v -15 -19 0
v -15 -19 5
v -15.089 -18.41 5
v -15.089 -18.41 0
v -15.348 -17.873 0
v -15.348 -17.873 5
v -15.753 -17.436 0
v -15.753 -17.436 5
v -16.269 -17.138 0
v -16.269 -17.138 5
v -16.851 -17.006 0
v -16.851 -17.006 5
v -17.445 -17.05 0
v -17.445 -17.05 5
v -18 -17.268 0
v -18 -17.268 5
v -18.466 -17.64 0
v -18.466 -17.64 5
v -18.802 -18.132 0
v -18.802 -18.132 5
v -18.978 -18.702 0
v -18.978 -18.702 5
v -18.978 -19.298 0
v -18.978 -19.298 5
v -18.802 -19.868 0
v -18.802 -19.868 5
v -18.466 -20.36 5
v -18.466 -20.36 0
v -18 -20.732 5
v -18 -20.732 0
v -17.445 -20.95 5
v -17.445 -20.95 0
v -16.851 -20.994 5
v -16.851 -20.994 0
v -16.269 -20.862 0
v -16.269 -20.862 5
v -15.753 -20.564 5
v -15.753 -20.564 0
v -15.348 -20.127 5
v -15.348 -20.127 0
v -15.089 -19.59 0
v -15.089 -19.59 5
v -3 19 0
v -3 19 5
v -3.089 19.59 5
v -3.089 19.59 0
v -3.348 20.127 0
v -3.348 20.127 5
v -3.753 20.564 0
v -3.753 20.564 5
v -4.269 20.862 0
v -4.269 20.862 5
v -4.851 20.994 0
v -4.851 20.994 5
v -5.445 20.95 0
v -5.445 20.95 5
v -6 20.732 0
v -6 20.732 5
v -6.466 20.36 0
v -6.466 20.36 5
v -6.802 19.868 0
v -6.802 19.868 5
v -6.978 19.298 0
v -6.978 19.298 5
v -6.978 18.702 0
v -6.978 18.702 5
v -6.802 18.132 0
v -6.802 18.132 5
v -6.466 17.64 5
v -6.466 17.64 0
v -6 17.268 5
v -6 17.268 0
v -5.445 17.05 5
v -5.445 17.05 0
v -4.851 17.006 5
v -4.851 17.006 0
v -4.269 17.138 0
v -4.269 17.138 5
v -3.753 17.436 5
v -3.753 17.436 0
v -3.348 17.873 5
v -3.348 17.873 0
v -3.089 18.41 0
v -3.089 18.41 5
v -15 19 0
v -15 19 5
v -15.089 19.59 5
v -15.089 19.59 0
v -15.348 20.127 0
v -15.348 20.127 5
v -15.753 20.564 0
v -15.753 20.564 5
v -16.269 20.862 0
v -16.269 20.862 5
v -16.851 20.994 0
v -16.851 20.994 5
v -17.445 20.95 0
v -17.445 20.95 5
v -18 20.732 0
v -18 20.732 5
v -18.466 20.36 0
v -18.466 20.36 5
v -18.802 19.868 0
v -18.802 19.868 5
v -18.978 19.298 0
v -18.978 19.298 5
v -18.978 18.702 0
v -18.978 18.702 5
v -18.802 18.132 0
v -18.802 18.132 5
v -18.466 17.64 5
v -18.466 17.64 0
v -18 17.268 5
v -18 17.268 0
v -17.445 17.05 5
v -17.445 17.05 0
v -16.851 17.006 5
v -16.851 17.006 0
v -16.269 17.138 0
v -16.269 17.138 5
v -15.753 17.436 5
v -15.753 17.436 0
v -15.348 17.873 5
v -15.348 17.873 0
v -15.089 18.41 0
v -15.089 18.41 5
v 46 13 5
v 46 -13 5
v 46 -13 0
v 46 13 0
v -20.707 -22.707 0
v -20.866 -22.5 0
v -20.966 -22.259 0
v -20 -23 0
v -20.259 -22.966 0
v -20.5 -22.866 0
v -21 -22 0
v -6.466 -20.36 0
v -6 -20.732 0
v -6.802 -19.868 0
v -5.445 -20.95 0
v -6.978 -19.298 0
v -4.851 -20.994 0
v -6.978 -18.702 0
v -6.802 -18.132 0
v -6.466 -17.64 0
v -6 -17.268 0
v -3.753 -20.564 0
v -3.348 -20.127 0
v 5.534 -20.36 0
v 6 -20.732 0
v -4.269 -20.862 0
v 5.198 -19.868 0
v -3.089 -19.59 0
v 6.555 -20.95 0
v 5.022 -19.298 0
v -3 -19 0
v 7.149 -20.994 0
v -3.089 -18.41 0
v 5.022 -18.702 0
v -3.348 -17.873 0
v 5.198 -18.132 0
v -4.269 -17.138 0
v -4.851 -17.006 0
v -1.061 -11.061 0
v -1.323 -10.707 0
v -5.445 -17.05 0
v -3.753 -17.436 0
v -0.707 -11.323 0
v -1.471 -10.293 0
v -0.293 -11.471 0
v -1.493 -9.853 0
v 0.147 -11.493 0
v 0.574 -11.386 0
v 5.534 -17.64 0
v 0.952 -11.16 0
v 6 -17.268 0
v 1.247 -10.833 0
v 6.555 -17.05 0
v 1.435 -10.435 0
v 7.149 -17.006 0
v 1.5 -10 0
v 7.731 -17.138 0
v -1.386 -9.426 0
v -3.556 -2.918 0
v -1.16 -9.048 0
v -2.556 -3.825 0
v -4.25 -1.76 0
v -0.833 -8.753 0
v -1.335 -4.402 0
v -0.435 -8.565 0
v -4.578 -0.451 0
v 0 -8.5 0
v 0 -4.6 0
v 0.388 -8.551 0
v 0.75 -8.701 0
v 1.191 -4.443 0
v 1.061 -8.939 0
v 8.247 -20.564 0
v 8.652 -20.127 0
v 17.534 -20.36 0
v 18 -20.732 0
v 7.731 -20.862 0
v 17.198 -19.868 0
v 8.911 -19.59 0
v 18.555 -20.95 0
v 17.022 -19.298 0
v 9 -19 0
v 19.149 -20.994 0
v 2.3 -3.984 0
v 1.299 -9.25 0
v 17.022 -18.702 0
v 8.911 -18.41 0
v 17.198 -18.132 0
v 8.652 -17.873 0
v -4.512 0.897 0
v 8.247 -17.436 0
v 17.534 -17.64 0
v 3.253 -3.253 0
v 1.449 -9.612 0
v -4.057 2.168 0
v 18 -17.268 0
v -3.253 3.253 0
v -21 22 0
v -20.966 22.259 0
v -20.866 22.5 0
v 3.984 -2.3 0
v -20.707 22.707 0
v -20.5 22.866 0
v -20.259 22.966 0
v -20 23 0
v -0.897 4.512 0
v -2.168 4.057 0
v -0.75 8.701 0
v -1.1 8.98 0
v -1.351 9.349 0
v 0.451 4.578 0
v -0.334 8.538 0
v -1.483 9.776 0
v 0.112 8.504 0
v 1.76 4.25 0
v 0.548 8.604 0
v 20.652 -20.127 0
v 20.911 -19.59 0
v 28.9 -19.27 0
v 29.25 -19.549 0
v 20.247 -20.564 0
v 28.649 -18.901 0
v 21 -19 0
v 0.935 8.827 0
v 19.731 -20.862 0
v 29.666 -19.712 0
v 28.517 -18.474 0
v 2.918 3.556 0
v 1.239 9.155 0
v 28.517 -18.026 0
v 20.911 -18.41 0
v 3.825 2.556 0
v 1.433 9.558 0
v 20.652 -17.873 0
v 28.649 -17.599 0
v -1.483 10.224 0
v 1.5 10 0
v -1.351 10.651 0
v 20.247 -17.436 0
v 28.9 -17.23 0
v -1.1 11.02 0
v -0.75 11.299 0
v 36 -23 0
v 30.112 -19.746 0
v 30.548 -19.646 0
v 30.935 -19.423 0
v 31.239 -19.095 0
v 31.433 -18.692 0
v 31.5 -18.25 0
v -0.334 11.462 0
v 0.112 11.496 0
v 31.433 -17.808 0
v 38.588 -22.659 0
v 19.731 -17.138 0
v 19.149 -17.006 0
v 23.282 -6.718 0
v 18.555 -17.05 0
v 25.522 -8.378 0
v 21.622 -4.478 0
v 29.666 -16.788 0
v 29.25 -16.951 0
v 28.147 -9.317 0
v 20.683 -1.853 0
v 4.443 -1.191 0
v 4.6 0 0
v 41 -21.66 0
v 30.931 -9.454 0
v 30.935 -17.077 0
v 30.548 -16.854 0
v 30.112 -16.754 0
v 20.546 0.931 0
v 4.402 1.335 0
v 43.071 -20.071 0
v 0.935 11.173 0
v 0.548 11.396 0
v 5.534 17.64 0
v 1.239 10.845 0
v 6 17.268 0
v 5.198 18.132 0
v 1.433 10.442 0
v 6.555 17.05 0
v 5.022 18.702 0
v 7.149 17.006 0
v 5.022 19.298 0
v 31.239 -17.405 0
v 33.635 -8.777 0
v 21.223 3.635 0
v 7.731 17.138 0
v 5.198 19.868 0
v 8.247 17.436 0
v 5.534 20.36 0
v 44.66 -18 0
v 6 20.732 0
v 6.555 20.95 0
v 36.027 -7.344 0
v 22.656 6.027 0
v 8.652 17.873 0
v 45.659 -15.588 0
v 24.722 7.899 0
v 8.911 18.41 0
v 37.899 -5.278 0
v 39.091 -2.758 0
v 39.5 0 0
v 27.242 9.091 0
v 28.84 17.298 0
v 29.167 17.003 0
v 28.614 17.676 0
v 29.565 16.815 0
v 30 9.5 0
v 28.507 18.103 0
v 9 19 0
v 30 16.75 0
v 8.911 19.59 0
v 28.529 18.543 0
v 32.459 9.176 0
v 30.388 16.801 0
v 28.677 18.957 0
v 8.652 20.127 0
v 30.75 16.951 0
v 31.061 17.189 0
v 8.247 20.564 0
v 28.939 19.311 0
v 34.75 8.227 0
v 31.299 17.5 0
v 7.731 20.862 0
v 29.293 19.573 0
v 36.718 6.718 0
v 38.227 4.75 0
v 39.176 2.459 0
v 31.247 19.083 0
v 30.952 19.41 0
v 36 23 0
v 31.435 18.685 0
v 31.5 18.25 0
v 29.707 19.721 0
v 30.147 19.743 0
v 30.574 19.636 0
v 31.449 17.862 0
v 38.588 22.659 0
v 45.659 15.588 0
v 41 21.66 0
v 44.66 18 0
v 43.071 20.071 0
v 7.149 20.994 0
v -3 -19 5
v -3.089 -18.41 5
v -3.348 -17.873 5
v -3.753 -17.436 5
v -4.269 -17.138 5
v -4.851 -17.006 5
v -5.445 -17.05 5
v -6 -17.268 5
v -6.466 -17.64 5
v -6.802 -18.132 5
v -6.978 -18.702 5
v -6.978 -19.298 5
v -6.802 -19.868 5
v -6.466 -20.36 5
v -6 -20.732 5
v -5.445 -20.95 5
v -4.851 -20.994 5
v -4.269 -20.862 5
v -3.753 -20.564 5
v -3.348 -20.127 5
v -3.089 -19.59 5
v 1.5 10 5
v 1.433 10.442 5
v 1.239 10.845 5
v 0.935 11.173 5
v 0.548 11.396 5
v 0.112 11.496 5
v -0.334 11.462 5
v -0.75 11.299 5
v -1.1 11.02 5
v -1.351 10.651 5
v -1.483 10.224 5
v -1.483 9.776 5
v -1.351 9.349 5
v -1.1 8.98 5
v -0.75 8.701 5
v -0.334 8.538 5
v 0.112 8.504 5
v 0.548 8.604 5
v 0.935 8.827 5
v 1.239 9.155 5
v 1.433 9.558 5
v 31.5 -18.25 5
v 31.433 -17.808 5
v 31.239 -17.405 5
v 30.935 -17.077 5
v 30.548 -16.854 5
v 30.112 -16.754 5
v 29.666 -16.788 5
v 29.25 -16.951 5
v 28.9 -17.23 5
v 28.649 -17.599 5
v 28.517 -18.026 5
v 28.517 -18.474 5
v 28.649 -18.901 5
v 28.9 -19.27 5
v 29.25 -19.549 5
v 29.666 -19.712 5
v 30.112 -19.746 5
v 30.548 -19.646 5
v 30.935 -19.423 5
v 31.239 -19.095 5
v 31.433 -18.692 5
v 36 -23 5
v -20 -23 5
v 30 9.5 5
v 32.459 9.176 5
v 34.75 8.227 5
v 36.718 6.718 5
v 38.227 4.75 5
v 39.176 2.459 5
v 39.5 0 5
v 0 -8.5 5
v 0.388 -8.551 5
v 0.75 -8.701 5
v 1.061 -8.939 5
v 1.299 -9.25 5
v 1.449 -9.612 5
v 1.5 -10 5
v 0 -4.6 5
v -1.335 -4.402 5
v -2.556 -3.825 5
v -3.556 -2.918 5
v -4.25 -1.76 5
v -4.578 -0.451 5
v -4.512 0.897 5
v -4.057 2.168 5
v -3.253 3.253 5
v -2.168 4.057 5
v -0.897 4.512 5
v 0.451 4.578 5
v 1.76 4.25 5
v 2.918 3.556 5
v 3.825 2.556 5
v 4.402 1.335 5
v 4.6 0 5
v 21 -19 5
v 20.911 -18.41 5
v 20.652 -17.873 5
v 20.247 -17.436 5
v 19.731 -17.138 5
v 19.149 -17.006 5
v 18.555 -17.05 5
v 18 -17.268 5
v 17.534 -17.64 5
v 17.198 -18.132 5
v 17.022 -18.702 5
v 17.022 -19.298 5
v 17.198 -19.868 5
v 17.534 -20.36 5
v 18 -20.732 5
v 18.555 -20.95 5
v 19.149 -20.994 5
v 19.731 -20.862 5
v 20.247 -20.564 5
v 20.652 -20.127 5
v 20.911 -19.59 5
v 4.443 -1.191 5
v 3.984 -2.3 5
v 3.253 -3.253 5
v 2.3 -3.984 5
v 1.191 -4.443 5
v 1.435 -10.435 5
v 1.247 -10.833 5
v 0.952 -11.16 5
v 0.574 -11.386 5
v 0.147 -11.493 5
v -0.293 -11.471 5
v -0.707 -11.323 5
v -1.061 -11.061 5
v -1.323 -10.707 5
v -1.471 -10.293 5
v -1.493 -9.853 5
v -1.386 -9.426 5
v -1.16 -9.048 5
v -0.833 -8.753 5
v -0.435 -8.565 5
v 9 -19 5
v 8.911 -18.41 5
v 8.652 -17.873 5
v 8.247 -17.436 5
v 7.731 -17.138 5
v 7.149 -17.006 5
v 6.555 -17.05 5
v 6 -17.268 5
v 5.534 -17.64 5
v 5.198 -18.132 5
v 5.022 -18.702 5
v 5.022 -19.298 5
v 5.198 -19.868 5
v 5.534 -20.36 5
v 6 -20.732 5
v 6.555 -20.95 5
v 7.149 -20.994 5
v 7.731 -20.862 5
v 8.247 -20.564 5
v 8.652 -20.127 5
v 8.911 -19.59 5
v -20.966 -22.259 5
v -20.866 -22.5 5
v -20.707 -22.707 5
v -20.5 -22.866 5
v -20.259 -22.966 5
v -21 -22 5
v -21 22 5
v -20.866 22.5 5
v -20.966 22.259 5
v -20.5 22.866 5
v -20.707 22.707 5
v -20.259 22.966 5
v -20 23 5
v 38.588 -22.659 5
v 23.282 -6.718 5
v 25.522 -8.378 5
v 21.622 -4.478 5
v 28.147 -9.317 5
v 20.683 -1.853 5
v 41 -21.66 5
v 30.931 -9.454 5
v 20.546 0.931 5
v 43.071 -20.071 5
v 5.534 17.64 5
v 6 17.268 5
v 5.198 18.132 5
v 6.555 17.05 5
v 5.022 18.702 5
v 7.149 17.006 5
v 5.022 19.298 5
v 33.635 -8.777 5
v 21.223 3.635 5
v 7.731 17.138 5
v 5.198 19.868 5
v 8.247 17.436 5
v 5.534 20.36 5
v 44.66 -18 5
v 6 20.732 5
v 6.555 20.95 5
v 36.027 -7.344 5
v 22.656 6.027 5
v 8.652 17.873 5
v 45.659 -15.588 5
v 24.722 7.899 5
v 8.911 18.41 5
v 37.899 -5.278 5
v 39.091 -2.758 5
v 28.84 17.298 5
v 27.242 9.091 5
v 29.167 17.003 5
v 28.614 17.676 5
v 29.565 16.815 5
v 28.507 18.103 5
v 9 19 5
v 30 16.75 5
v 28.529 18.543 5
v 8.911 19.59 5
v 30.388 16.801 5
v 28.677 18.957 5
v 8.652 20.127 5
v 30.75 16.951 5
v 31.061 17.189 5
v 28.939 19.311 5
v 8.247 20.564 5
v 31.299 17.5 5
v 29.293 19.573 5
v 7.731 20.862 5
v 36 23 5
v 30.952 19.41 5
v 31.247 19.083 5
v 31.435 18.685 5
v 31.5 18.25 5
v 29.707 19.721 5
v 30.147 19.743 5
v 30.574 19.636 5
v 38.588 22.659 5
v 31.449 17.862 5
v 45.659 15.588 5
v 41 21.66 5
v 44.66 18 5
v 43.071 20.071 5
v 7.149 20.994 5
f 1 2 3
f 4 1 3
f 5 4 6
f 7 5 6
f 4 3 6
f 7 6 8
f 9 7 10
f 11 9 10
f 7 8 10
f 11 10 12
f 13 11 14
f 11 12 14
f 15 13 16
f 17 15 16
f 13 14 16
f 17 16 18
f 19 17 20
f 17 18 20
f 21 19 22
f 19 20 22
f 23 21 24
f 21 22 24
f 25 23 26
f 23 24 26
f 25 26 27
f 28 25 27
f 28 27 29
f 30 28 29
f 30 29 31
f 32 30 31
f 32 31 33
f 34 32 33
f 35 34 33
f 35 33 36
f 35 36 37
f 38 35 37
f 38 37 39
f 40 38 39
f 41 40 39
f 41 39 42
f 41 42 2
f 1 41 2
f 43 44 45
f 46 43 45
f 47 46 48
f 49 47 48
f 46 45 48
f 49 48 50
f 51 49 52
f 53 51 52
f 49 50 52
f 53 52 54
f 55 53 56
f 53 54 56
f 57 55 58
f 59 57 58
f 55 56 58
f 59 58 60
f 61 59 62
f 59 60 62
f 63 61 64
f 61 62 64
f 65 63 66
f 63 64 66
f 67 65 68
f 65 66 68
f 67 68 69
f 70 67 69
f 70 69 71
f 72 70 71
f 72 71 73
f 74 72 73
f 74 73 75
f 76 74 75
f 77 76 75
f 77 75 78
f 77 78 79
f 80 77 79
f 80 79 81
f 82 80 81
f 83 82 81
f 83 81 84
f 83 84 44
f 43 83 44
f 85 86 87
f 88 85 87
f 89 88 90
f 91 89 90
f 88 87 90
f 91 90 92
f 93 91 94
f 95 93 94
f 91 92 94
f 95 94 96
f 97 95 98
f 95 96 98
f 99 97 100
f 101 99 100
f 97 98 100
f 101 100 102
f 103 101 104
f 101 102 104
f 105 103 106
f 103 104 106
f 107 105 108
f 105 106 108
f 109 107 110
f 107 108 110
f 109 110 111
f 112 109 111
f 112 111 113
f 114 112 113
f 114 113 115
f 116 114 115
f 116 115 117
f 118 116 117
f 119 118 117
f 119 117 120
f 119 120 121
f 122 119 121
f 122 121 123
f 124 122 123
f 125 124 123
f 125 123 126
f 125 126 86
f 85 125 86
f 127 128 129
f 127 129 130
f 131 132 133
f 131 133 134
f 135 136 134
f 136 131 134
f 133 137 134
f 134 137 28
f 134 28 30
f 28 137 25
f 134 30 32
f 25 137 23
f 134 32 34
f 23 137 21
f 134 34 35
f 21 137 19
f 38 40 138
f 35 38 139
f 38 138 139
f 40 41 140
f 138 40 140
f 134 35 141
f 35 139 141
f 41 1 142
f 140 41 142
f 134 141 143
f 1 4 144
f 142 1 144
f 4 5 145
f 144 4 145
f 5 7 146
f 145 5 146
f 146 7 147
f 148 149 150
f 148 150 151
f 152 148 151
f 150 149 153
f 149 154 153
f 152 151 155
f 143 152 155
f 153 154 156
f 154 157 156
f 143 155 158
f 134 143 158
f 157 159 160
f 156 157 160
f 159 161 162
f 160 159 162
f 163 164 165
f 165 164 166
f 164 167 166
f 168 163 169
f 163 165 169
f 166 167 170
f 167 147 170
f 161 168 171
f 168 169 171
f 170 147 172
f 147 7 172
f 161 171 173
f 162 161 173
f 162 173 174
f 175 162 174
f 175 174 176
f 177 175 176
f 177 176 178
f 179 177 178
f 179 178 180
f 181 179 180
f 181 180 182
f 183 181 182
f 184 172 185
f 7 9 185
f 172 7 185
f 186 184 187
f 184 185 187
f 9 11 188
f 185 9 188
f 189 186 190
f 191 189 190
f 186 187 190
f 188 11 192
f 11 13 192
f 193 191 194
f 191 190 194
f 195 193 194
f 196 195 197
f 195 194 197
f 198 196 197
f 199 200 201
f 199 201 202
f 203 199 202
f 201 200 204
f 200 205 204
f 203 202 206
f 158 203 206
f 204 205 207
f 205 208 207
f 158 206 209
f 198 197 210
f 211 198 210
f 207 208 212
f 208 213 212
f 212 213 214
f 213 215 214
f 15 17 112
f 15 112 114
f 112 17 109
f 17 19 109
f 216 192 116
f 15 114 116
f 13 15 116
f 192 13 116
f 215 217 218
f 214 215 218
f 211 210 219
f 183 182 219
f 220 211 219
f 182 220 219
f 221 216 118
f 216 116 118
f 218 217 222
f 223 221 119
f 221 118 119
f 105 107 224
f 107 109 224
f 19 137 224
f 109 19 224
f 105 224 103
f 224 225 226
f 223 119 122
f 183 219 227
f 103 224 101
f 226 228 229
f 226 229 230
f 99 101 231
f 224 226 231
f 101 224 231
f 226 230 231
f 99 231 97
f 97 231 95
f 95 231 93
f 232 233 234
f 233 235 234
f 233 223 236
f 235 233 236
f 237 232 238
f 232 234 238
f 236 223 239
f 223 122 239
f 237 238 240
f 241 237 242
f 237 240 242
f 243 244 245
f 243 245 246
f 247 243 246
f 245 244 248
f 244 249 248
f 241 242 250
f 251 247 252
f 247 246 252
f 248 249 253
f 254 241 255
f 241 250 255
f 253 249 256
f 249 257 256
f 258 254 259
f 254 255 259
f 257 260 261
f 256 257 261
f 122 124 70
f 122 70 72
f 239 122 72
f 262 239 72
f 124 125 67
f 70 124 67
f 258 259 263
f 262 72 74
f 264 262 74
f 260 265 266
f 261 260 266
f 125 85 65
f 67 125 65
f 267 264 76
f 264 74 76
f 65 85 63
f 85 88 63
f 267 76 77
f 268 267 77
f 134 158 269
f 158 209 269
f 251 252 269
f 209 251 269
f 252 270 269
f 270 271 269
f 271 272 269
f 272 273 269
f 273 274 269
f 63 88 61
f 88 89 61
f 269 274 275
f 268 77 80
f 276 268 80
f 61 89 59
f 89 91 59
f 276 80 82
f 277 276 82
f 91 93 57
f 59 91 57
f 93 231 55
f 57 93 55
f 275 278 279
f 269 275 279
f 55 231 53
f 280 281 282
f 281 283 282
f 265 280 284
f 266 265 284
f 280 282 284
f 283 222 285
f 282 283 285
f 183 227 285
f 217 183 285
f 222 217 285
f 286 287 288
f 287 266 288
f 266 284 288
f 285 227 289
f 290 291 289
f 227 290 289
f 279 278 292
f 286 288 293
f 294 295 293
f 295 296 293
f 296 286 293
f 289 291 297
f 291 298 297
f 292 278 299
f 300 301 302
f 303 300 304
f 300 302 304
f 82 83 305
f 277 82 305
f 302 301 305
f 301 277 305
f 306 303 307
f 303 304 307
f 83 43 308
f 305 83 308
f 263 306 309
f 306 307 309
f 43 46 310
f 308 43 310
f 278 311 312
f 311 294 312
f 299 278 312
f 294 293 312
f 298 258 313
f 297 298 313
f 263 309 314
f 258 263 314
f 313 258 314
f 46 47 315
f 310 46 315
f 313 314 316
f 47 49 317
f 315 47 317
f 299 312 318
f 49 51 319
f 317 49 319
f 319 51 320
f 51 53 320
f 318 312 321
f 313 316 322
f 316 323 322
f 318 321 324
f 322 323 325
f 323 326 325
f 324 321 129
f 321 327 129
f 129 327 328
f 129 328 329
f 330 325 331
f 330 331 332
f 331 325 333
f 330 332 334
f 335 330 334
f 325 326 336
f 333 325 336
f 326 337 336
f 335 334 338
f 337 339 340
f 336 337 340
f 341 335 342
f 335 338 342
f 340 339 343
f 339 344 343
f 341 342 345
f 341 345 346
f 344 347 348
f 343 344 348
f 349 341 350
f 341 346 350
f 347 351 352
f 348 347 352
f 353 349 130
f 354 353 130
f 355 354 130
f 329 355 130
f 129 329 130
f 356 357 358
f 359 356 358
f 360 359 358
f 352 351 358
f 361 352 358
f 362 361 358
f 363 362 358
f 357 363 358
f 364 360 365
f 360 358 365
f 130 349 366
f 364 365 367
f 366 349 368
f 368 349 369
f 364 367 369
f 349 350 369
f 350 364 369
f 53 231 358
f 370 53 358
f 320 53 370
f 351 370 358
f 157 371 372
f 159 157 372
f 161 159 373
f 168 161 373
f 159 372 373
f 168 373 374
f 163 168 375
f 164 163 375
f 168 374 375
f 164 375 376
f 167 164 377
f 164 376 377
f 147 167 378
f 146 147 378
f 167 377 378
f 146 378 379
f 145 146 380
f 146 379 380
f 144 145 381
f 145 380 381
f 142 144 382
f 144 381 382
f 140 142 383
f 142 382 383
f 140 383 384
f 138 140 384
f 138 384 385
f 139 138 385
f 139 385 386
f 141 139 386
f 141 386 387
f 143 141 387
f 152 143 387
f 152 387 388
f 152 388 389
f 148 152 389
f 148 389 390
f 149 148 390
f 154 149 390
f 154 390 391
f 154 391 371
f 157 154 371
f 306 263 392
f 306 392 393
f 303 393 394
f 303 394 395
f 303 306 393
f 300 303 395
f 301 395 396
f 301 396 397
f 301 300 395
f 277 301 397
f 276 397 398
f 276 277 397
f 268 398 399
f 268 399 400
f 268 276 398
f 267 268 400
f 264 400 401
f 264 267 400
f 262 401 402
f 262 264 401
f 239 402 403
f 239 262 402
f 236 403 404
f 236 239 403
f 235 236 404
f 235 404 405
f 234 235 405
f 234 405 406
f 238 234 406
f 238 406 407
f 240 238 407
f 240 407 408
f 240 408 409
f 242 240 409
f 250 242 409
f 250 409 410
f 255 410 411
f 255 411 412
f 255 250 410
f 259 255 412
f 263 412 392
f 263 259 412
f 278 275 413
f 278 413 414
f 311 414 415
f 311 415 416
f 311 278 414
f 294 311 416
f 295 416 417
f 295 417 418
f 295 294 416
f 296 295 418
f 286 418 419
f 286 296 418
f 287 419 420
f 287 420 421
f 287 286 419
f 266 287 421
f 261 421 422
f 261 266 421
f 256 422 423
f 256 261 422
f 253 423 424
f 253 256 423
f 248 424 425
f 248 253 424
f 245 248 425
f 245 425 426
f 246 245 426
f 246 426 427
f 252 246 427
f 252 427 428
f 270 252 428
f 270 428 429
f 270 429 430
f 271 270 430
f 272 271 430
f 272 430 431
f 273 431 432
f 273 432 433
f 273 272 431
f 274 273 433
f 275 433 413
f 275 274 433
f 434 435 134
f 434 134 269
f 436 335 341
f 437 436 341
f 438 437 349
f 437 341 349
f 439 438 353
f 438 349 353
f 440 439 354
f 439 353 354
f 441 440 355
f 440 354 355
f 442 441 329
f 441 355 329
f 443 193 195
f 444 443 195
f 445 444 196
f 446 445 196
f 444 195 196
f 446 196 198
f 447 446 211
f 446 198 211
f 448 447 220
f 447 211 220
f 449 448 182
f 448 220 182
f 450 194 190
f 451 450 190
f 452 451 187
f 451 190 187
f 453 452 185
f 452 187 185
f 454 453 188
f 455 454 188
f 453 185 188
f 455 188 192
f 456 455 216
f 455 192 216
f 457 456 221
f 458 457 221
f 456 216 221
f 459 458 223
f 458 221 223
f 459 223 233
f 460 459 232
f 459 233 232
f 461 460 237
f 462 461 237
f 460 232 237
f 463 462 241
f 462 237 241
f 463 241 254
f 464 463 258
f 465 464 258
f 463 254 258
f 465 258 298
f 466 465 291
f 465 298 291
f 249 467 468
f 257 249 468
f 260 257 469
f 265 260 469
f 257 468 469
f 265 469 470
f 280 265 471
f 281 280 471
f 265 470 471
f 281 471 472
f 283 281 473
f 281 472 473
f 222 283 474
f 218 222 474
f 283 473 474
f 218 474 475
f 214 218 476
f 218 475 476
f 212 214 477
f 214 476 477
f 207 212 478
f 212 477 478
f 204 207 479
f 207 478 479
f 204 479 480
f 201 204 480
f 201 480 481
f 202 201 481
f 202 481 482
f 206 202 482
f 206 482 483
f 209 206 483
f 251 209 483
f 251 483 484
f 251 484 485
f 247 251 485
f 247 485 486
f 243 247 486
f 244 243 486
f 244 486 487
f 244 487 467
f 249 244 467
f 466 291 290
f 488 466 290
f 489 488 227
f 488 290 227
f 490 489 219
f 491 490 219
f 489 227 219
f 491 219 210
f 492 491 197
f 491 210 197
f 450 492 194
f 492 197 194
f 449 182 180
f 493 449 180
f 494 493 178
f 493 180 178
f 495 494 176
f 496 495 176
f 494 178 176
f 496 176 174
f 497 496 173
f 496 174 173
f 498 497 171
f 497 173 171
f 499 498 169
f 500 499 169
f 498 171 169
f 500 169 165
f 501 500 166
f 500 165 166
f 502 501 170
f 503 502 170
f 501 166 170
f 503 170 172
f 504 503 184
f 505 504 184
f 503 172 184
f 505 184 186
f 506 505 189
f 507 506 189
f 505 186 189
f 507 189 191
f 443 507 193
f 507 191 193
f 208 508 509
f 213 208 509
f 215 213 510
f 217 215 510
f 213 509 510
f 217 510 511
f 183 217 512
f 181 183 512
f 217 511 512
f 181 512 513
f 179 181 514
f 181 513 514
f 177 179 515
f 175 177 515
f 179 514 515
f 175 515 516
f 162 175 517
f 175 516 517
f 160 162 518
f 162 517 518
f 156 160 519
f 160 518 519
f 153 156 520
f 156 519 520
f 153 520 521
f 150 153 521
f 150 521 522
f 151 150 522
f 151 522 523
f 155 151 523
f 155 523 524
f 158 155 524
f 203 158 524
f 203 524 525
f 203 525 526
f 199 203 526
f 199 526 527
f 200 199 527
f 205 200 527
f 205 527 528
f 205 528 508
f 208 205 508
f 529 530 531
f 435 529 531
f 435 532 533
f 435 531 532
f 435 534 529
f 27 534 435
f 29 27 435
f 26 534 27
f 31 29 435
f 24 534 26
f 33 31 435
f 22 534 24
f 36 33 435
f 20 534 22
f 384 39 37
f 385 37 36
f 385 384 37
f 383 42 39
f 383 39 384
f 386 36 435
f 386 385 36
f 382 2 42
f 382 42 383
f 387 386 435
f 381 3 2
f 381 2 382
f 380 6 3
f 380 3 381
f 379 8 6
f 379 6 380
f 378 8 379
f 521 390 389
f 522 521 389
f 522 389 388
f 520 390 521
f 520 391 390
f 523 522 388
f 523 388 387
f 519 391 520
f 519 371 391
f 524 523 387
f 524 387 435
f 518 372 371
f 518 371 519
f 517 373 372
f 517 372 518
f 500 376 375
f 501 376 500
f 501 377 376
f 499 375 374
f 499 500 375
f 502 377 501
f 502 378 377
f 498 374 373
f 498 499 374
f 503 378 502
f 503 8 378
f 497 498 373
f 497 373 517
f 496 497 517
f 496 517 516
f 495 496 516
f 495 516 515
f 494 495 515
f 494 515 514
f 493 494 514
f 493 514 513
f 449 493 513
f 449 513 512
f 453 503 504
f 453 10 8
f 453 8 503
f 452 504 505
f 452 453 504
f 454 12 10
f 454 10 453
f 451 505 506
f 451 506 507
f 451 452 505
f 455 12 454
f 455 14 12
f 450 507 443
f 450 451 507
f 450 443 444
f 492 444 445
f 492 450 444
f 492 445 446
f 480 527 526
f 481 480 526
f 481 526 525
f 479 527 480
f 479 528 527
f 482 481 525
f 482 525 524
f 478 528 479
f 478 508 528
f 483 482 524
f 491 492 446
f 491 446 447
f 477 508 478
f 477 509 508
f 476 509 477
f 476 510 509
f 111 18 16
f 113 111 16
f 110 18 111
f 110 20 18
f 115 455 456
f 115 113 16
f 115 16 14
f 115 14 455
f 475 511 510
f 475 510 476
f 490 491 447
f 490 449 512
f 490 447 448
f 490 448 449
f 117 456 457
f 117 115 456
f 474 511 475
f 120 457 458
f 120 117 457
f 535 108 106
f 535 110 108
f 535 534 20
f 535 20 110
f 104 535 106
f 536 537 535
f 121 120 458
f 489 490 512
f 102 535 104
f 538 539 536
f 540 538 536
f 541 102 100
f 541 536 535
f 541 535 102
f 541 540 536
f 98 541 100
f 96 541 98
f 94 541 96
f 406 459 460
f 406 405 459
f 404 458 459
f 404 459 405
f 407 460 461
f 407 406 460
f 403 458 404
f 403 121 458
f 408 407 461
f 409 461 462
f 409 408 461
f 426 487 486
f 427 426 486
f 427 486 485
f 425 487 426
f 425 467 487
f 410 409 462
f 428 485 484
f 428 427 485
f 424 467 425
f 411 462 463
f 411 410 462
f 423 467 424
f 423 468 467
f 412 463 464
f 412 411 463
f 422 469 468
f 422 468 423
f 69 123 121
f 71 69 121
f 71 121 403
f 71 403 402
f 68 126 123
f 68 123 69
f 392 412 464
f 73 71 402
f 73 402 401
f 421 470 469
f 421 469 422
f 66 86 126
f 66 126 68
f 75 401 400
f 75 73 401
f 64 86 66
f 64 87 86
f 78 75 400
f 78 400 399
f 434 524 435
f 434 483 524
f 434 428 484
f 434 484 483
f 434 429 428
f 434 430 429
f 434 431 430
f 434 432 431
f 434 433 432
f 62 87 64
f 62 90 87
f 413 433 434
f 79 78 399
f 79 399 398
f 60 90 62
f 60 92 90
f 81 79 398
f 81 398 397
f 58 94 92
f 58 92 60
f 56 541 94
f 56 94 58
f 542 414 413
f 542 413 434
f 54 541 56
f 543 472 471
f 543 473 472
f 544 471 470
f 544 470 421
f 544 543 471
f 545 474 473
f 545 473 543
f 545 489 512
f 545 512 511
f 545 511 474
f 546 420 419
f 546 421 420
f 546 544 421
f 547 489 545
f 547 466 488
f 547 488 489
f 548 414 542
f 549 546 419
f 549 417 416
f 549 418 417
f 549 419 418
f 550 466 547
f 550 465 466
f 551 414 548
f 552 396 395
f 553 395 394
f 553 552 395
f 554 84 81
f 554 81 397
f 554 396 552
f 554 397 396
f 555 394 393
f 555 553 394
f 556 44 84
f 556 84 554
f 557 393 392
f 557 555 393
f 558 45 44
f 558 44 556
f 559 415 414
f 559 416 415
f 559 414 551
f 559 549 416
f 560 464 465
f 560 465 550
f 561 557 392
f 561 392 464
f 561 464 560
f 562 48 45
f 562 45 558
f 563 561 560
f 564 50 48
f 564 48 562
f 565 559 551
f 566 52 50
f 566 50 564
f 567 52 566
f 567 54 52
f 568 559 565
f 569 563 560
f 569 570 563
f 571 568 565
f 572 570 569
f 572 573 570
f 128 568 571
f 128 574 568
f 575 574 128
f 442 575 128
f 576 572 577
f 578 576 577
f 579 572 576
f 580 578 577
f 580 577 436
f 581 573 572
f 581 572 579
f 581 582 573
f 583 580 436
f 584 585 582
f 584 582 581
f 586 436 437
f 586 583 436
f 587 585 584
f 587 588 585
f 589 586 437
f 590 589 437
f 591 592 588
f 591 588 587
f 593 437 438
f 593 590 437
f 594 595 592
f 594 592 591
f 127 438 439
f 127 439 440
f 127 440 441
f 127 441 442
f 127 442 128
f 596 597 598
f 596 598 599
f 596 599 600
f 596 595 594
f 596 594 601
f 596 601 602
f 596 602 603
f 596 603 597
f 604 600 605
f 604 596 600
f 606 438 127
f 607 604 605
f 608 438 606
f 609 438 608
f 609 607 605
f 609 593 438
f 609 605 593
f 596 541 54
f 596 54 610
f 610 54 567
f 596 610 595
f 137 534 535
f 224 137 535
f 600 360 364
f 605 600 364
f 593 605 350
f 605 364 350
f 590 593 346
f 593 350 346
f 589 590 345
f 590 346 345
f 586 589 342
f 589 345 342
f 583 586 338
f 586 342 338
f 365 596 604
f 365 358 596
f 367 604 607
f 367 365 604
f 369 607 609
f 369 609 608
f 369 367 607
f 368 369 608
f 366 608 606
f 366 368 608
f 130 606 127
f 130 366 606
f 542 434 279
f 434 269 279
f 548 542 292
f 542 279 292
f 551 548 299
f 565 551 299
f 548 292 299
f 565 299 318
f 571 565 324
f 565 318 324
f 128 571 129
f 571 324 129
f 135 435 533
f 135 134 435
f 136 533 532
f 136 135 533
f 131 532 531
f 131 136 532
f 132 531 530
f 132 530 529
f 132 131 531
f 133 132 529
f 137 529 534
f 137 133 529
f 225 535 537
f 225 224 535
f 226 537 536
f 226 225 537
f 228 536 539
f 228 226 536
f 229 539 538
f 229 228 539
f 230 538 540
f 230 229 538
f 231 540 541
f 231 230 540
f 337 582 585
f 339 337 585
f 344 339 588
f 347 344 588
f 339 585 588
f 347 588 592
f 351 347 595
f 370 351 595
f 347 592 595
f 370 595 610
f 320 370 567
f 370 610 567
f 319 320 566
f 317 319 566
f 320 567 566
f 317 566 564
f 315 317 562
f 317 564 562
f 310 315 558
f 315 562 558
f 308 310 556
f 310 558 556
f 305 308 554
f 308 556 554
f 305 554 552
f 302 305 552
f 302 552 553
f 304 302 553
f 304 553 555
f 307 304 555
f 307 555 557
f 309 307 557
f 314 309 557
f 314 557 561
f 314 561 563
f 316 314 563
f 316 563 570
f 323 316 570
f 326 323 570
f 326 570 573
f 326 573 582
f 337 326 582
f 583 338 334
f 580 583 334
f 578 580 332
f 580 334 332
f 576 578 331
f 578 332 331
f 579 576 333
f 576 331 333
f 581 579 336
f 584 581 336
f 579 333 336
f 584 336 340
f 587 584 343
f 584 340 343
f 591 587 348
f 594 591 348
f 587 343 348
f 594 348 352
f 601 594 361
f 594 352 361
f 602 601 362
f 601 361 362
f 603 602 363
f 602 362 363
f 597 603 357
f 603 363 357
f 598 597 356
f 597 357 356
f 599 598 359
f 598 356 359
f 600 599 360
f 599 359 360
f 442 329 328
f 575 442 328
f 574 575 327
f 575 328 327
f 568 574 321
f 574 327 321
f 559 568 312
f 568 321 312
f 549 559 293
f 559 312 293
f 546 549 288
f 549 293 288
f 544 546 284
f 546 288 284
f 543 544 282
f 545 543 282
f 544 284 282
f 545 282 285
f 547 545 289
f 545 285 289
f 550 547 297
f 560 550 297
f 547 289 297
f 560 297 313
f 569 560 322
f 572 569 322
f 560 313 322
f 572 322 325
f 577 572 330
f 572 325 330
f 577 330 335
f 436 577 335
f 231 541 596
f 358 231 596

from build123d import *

# Parameters (mm, degrees)
SKETCH1_W           = 65
SKETCH1_H           = 46
SKETCH1_R           = 1.5
BOSS_EXTRUDE1_DEPTH = 5
SKETCH2_R           = 2
CUT_EXTRUDE1_DEPTH  = 10
SKETCH3_W           = 4
SKETCH3_H           = 46
CUT_EXTRUDE2_DEPTH  = 6
SKETCH4_W           = 6
SKETCH4_H           = 46
BOSS_EXTRUDE2_DEPTH = 5
FILLET1_R           = 10
FILLET2_R           = 1
SKETCH2_3_R         = 2
CUT_EXTRUDE3_DEPTH  = 10


with BuildPart() as part:
    # Sketch1 → Boss-Extrude1 (new body)
    with BuildSketch(Plane.XY):
        with Locations((7.5, 0)):
            Rectangle(SKETCH1_W, SKETCH1_H)
        with BuildLine():
            ThreePointArc((4.6, 0), (3.252691193, -3.252691193), (0, -4.6))
            ThreePointArc((0, -4.6), (-3.252691193, 3.252691193), (4.6, 0))
        make_face(mode=Mode.SUBTRACT)
        with Locations((30, -18.25)):
            Circle(SKETCH1_R, mode=Mode.SUBTRACT)
        with BuildLine():
            ThreePointArc((1.5, -10), (-1.060660172, -11.060660172), (0, -8.5))
            ThreePointArc((0, -8.5), (1.060660172, -8.939339828), (1.5, -10))
        make_face(mode=Mode.SUBTRACT)
        with BuildLine():
            ThreePointArc((39.5, 0), (23.282485579, -6.717514421), (30, 9.5))
            ThreePointArc((30, 9.5), (36.717514421, 6.717514421), (39.5, 0))
        make_face(mode=Mode.SUBTRACT)
        with Locations((0, 10)):
            Circle(SKETCH1_R, mode=Mode.SUBTRACT)
        with BuildLine():
            ThreePointArc((31.5, 18.25), (31.060660172, 17.189339828), (30, 16.75))
            ThreePointArc((30, 16.75), (28.939339828, 19.310660172), (31.5, 18.25))
        make_face(mode=Mode.SUBTRACT)
    extrude(amount=BOSS_EXTRUDE1_DEPTH)

    # Sketch2 → Cut-Extrude1 (cut)
    with BuildSketch(Plane.XY.offset(5)):
        with Locations((7, 19)):
            Circle(SKETCH2_R)
        with Locations((-5, -19)):
            Circle(SKETCH2_R)
        with Locations((-17, 19)):
            Circle(SKETCH2_R)
        with Locations((-5, 19)):
            Circle(SKETCH2_R)
        with Locations((7, -19)):
            Circle(SKETCH2_R)
        with Locations((-17, -19)):
            Circle(SKETCH2_R)
    extrude(amount=-CUT_EXTRUDE1_DEPTH, mode=Mode.SUBTRACT)

    # Sketch3 → Cut-Extrude2 (cut, through all)
    with BuildSketch(Plane.XY.offset(5)):
        with Locations((-23, 0)):
            Rectangle(SKETCH3_W, SKETCH3_H)
    extrude(amount=-CUT_EXTRUDE2_DEPTH, mode=Mode.SUBTRACT)

    # Sketch4 → Boss-Extrude2 (add)
    with BuildSketch(Plane.XY.offset(5)):
        with Locations((43, 0)):
            Rectangle(SKETCH4_W, SKETCH4_H)
    extrude(amount=-BOSS_EXTRUDE2_DEPTH)

    # Fillet1
    fillet1_edges = [part.edges().sort_by_distance(p)[0] for p in [
        (46, -23, 2.5),
        (46, 23, 2.5),
    ]]
    fillet(fillet1_edges, radius=FILLET1_R)

    # Fillet2
    fillet2_edges = [part.edges().sort_by_distance(p)[0] for p in [
        (-21, 23, 2.5),
        (-21, -23, 2.5),
    ]]
    fillet(fillet2_edges, radius=FILLET2_R)

    # Sketch2<3> → Cut-Extrude3 (cut)
    with BuildSketch(Plane.XY.offset(5)):
        with Locations((19, -19)):
            Circle(SKETCH2_3_R)
    extrude(amount=-CUT_EXTRUDE3_DEPTH, mode=Mode.SUBTRACT)


solid = part.part
